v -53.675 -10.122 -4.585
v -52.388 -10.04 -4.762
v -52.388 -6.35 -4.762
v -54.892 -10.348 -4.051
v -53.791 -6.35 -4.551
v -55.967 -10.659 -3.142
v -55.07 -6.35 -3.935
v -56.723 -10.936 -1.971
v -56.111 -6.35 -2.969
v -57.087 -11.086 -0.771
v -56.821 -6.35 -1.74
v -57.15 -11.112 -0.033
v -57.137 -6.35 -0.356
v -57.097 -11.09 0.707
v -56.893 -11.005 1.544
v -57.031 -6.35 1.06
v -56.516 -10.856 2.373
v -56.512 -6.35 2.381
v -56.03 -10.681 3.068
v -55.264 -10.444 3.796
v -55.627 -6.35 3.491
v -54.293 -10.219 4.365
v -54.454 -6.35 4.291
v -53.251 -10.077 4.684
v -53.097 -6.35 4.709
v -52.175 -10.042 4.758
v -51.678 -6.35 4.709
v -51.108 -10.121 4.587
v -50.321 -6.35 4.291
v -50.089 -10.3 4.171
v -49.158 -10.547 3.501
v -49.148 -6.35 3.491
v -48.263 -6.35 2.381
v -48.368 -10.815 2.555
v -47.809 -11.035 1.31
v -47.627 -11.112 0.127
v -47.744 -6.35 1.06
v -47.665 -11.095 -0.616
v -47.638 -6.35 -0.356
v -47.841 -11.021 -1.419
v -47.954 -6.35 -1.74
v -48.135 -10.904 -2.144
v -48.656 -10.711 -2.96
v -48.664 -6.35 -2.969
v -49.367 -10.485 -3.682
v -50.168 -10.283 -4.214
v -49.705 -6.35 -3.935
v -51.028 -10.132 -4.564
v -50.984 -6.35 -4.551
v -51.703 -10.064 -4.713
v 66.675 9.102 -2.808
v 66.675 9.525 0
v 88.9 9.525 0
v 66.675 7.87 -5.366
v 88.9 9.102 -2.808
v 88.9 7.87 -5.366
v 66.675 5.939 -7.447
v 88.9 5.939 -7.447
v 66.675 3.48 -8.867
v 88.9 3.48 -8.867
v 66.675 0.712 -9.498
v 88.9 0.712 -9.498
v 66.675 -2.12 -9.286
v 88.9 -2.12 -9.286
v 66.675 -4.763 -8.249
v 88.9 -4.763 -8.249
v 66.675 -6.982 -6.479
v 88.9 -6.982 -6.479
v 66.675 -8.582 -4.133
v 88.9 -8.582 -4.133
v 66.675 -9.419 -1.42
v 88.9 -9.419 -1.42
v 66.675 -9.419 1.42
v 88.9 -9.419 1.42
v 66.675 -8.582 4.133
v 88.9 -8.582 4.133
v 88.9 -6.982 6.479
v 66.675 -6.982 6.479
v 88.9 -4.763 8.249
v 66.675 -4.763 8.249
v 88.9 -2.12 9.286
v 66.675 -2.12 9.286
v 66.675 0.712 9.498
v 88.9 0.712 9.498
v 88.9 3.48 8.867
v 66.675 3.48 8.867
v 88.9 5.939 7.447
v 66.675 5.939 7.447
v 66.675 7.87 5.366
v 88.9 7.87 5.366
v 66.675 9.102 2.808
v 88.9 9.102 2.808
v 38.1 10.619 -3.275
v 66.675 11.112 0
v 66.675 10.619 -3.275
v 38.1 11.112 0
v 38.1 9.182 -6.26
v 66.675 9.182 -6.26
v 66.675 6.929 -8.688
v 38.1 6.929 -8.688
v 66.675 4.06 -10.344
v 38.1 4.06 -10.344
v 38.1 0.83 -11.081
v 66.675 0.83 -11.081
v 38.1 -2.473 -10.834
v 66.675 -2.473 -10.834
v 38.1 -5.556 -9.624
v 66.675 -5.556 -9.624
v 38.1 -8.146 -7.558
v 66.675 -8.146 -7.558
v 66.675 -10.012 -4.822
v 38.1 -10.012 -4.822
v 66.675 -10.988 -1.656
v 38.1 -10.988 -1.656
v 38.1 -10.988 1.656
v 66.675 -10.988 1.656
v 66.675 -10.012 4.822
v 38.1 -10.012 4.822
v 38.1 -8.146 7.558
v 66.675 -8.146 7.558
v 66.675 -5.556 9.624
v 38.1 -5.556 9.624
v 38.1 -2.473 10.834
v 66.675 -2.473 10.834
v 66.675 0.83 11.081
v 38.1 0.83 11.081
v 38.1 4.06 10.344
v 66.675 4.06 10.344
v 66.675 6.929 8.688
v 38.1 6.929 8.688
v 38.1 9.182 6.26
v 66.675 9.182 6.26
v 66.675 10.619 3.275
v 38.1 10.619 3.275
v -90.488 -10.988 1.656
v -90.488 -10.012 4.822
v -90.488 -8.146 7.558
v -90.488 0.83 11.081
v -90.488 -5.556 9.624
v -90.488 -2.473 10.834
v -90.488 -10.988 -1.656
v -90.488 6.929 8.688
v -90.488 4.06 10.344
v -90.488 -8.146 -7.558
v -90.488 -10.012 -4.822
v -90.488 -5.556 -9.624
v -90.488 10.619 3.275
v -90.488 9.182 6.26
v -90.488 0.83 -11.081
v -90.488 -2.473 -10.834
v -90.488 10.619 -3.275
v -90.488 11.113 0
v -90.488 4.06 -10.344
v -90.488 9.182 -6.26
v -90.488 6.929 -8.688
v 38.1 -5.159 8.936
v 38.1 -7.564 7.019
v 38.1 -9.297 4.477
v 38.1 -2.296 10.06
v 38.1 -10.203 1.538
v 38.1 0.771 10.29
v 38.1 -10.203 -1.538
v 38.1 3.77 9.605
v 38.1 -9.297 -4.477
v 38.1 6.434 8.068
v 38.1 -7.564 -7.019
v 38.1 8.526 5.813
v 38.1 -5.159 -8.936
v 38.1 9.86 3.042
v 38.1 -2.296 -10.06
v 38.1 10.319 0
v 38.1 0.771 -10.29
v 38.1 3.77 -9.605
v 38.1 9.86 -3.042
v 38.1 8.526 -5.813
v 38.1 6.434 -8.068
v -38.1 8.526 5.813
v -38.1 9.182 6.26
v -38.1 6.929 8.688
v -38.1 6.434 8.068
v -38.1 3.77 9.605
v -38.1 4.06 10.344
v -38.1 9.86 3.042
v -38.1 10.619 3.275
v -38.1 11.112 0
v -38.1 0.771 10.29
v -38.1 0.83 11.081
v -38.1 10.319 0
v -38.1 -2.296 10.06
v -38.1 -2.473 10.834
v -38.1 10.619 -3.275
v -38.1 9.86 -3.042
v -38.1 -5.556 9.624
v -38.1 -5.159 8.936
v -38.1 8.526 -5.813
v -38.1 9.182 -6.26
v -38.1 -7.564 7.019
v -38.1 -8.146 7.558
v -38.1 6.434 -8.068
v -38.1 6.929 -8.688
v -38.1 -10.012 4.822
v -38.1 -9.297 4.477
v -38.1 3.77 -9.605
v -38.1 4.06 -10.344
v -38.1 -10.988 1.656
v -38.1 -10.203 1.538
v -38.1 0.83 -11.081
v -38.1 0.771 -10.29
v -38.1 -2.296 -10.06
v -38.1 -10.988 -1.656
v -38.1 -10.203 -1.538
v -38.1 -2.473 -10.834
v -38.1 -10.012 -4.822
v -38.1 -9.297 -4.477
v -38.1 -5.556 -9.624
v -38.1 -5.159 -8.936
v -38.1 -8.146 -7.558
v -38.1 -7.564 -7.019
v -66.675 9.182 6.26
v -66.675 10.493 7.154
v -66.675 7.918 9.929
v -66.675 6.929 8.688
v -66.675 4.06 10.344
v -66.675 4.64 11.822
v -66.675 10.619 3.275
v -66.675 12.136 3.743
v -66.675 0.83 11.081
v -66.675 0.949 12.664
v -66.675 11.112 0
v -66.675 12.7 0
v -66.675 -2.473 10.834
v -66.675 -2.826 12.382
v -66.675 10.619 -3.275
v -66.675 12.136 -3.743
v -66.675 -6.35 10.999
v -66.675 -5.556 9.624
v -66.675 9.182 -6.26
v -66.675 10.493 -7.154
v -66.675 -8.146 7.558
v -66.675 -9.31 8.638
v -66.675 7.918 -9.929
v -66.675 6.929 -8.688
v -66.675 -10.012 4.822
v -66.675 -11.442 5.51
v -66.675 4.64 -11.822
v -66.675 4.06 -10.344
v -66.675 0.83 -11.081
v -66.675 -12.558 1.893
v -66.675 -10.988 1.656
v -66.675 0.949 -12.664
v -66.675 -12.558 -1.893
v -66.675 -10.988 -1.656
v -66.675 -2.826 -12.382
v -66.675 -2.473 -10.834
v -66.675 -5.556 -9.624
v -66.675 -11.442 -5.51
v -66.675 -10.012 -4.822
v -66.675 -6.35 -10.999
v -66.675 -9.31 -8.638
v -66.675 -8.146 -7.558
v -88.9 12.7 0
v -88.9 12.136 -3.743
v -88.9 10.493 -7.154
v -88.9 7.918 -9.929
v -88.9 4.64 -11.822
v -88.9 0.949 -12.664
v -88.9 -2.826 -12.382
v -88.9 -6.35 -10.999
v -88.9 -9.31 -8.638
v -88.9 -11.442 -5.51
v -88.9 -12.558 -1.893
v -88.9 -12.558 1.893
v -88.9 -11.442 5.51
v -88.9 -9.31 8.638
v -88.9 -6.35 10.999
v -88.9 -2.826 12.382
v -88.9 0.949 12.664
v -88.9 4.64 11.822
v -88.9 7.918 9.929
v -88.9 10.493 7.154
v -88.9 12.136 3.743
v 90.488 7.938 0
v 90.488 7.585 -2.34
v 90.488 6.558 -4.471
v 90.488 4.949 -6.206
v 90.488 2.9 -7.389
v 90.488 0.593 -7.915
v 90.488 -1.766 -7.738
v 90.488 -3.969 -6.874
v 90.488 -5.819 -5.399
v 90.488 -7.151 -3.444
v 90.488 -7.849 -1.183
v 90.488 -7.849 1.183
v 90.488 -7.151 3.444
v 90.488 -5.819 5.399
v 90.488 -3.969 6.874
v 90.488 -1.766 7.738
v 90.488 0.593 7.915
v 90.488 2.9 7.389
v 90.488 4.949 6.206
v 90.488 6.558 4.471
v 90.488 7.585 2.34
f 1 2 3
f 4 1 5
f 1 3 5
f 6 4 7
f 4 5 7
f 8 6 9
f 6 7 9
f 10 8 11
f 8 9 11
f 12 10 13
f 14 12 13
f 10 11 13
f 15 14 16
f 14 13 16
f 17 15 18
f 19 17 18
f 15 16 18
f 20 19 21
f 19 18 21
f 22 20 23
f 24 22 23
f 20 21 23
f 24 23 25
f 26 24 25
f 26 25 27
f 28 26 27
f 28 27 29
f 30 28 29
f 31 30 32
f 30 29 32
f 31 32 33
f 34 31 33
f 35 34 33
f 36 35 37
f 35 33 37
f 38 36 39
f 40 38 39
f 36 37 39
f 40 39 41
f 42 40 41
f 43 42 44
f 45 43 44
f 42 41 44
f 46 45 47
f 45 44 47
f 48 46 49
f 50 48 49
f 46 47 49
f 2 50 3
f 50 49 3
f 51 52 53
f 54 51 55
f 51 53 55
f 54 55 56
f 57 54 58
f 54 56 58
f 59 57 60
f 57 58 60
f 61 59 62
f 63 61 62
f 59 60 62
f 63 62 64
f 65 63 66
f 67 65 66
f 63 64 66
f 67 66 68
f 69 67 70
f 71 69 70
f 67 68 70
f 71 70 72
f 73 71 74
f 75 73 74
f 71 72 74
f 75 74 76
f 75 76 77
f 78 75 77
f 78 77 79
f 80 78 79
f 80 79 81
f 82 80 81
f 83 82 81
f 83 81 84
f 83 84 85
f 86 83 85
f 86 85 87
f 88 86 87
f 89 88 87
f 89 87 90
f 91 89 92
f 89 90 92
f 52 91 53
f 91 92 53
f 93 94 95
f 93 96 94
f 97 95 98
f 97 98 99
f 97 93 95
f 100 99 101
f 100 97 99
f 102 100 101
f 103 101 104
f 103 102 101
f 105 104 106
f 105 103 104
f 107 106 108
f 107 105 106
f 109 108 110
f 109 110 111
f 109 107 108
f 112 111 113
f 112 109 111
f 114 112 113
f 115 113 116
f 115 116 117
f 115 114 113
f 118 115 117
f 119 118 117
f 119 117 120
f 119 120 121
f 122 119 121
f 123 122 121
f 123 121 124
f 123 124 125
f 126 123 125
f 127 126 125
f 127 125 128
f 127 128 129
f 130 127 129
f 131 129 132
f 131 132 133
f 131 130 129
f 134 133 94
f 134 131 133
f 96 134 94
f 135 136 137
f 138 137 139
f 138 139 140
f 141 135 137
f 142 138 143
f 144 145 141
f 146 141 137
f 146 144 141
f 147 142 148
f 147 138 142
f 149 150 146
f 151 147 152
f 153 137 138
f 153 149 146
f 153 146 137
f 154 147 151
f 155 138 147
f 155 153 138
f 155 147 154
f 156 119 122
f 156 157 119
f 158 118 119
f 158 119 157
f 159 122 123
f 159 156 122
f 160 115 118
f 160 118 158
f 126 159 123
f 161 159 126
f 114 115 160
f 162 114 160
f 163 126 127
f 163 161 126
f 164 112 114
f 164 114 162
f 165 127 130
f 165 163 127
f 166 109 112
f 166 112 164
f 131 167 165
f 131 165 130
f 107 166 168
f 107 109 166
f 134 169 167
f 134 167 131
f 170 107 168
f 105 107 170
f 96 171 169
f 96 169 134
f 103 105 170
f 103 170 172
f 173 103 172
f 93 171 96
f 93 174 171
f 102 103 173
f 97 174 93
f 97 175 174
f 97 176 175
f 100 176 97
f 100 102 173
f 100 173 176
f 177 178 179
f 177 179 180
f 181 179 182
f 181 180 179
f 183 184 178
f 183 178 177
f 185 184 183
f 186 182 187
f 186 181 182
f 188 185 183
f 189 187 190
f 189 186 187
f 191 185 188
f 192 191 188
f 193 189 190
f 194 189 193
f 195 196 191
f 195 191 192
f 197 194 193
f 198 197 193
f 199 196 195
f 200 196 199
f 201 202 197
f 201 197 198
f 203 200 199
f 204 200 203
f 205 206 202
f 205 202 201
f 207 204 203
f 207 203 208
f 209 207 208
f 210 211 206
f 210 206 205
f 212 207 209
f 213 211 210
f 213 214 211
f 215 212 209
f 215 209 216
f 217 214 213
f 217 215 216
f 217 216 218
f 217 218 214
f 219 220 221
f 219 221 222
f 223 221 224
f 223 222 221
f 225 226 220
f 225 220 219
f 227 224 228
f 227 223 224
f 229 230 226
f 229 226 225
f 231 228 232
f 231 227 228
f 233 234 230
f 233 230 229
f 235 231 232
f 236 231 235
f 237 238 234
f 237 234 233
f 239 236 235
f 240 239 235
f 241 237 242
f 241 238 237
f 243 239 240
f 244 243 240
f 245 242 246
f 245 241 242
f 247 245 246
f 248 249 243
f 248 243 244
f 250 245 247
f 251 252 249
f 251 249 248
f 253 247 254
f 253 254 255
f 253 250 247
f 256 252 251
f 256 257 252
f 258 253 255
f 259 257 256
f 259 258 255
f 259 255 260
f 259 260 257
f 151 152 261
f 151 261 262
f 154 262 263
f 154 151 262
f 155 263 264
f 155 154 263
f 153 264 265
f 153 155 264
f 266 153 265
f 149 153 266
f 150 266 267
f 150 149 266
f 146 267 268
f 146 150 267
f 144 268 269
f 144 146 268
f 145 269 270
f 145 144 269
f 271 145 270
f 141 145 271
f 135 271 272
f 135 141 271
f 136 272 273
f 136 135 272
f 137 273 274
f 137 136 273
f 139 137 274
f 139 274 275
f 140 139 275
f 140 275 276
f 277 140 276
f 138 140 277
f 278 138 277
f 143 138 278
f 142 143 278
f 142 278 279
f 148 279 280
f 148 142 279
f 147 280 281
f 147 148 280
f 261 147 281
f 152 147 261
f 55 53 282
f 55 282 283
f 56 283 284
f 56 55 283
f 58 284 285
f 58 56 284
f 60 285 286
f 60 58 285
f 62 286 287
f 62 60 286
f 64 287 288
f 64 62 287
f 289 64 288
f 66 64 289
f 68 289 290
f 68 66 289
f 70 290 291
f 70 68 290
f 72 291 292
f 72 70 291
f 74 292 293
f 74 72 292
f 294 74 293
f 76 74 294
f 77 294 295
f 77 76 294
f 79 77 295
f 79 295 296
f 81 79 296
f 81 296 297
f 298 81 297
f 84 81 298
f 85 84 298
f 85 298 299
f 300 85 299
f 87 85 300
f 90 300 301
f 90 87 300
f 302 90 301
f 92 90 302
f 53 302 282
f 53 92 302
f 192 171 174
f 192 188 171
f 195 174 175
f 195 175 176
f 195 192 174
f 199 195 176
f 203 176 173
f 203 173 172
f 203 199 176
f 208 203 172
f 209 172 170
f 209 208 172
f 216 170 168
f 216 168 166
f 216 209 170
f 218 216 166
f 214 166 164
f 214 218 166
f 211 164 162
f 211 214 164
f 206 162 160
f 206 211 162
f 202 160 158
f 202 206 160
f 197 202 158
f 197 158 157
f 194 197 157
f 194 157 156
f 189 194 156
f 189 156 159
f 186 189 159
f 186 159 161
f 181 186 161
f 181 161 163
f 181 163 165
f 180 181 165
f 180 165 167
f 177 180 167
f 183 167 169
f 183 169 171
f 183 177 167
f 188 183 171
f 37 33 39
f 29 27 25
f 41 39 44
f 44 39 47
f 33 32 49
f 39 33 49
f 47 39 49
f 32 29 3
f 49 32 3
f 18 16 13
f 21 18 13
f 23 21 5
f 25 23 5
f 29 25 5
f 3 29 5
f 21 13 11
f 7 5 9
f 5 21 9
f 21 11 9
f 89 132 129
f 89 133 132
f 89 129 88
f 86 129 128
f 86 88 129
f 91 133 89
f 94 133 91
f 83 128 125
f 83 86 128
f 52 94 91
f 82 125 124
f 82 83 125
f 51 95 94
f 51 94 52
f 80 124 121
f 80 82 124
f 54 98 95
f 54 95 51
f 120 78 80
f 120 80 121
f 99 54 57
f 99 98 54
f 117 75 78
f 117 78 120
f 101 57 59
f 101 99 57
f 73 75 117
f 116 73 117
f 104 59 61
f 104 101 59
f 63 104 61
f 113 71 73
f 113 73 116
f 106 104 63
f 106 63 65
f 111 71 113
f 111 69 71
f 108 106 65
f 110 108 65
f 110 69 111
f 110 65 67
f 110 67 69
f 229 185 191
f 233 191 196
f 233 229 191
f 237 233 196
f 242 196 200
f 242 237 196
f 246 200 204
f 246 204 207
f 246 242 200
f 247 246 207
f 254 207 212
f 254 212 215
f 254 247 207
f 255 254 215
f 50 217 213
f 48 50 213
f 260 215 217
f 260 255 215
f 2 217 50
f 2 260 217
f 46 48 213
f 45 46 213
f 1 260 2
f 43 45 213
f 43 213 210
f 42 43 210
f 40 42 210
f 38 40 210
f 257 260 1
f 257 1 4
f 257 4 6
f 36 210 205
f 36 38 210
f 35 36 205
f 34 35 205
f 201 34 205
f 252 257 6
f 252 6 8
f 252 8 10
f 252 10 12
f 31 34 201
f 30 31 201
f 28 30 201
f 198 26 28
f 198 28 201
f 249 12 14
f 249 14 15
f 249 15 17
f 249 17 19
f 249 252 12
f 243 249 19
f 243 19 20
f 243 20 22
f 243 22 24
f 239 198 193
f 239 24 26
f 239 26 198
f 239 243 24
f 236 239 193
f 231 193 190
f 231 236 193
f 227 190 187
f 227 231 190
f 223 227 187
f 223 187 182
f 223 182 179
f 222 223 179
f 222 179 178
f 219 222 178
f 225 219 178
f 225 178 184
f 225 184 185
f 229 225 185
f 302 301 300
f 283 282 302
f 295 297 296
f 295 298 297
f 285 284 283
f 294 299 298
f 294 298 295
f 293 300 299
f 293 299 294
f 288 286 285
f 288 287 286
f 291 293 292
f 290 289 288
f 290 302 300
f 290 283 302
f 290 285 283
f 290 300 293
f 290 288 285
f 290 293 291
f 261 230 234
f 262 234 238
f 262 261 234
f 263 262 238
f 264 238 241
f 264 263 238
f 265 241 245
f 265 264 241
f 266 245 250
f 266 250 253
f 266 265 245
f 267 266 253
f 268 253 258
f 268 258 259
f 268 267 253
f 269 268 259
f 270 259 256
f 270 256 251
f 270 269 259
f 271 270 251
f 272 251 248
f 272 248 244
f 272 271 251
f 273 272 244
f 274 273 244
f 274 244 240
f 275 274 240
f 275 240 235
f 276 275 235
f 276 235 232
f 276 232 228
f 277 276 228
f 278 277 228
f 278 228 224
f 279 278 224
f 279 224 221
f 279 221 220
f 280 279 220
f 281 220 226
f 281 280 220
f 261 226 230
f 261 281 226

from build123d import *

# Parameters (mm, degrees)
SKETCH2_W     = 38.1
SKETCH2_H     = 10.31875
SKETCH2_W_2   = 23.8125
SKETCH2_H_2   = 9.525
CHAMFER4_SIZE = 1.5875
CHAMFER5_SIZE = 1.5875
SKETCH3_W     = 4.7625
SKETCH3_H     = 4.7625


with BuildPart() as part:
    # Sketch2 → Revolve1 (revolve)
    with BuildSketch(Plane.XY):
        Polygon((-90.4875, 12.7), (-90.4875, 0), (-66.675, 0), (-66.675, 11.1125), (-66.675, 12.7), align=None)
        Polygon((-66.675, 11.1125), (-66.675, 0), (-38.1, 0), (-38.1, 10.31875), (-38.1, 11.1125), align=None)
        with Locations((-19.05, 5.159375)):
            Rectangle(SKETCH2_W, SKETCH2_H)
        with Locations((19.05, 5.159375)):
            Rectangle(SKETCH2_W, SKETCH2_H)
        Polygon((38.1, 10.31875), (38.1, 0), (66.675, 0), (66.675, 9.525), (66.675, 11.1125), (38.1, 11.1125), align=None)
        with Locations((78.58125, 4.7625)):
            Rectangle(SKETCH2_W_2, SKETCH2_H_2)
    revolve(axis=Axis((90.4875, 0, 0), (-1, 0, 0)))

    # Chamfer4
    chamfer4_edges = [part.edges().sort_by_distance(p)[0] for p in [
        (90.4875, -9.525, 0),
    ]]
    chamfer(chamfer4_edges, length=CHAMFER4_SIZE)

    # Chamfer5
    chamfer5_edges = [part.edges().sort_by_distance(p)[0] for p in [
        (-90.4875, -12.7, 0),
    ]]
    chamfer(chamfer5_edges, length=CHAMFER5_SIZE)

    # Sketch3 → Cut-Revolve1 (revolve, cut)
    with BuildSketch(Plane.XY, mode=Mode.PRIVATE) as cut_revolve1_sk:
        with Locations((-54.76875, -8.73125)):
            Rectangle(SKETCH3_W, SKETCH3_H)
    revolve(cut_revolve1_sk.sketch.rotate(Axis((-52.3875, -1001.138899493, 0), (0, 1, 0)), 270), axis=Axis((-52.3875, -1001.138899493, 0), (0, 1, 0)), mode=Mode.SUBTRACT)


solid = part.part
